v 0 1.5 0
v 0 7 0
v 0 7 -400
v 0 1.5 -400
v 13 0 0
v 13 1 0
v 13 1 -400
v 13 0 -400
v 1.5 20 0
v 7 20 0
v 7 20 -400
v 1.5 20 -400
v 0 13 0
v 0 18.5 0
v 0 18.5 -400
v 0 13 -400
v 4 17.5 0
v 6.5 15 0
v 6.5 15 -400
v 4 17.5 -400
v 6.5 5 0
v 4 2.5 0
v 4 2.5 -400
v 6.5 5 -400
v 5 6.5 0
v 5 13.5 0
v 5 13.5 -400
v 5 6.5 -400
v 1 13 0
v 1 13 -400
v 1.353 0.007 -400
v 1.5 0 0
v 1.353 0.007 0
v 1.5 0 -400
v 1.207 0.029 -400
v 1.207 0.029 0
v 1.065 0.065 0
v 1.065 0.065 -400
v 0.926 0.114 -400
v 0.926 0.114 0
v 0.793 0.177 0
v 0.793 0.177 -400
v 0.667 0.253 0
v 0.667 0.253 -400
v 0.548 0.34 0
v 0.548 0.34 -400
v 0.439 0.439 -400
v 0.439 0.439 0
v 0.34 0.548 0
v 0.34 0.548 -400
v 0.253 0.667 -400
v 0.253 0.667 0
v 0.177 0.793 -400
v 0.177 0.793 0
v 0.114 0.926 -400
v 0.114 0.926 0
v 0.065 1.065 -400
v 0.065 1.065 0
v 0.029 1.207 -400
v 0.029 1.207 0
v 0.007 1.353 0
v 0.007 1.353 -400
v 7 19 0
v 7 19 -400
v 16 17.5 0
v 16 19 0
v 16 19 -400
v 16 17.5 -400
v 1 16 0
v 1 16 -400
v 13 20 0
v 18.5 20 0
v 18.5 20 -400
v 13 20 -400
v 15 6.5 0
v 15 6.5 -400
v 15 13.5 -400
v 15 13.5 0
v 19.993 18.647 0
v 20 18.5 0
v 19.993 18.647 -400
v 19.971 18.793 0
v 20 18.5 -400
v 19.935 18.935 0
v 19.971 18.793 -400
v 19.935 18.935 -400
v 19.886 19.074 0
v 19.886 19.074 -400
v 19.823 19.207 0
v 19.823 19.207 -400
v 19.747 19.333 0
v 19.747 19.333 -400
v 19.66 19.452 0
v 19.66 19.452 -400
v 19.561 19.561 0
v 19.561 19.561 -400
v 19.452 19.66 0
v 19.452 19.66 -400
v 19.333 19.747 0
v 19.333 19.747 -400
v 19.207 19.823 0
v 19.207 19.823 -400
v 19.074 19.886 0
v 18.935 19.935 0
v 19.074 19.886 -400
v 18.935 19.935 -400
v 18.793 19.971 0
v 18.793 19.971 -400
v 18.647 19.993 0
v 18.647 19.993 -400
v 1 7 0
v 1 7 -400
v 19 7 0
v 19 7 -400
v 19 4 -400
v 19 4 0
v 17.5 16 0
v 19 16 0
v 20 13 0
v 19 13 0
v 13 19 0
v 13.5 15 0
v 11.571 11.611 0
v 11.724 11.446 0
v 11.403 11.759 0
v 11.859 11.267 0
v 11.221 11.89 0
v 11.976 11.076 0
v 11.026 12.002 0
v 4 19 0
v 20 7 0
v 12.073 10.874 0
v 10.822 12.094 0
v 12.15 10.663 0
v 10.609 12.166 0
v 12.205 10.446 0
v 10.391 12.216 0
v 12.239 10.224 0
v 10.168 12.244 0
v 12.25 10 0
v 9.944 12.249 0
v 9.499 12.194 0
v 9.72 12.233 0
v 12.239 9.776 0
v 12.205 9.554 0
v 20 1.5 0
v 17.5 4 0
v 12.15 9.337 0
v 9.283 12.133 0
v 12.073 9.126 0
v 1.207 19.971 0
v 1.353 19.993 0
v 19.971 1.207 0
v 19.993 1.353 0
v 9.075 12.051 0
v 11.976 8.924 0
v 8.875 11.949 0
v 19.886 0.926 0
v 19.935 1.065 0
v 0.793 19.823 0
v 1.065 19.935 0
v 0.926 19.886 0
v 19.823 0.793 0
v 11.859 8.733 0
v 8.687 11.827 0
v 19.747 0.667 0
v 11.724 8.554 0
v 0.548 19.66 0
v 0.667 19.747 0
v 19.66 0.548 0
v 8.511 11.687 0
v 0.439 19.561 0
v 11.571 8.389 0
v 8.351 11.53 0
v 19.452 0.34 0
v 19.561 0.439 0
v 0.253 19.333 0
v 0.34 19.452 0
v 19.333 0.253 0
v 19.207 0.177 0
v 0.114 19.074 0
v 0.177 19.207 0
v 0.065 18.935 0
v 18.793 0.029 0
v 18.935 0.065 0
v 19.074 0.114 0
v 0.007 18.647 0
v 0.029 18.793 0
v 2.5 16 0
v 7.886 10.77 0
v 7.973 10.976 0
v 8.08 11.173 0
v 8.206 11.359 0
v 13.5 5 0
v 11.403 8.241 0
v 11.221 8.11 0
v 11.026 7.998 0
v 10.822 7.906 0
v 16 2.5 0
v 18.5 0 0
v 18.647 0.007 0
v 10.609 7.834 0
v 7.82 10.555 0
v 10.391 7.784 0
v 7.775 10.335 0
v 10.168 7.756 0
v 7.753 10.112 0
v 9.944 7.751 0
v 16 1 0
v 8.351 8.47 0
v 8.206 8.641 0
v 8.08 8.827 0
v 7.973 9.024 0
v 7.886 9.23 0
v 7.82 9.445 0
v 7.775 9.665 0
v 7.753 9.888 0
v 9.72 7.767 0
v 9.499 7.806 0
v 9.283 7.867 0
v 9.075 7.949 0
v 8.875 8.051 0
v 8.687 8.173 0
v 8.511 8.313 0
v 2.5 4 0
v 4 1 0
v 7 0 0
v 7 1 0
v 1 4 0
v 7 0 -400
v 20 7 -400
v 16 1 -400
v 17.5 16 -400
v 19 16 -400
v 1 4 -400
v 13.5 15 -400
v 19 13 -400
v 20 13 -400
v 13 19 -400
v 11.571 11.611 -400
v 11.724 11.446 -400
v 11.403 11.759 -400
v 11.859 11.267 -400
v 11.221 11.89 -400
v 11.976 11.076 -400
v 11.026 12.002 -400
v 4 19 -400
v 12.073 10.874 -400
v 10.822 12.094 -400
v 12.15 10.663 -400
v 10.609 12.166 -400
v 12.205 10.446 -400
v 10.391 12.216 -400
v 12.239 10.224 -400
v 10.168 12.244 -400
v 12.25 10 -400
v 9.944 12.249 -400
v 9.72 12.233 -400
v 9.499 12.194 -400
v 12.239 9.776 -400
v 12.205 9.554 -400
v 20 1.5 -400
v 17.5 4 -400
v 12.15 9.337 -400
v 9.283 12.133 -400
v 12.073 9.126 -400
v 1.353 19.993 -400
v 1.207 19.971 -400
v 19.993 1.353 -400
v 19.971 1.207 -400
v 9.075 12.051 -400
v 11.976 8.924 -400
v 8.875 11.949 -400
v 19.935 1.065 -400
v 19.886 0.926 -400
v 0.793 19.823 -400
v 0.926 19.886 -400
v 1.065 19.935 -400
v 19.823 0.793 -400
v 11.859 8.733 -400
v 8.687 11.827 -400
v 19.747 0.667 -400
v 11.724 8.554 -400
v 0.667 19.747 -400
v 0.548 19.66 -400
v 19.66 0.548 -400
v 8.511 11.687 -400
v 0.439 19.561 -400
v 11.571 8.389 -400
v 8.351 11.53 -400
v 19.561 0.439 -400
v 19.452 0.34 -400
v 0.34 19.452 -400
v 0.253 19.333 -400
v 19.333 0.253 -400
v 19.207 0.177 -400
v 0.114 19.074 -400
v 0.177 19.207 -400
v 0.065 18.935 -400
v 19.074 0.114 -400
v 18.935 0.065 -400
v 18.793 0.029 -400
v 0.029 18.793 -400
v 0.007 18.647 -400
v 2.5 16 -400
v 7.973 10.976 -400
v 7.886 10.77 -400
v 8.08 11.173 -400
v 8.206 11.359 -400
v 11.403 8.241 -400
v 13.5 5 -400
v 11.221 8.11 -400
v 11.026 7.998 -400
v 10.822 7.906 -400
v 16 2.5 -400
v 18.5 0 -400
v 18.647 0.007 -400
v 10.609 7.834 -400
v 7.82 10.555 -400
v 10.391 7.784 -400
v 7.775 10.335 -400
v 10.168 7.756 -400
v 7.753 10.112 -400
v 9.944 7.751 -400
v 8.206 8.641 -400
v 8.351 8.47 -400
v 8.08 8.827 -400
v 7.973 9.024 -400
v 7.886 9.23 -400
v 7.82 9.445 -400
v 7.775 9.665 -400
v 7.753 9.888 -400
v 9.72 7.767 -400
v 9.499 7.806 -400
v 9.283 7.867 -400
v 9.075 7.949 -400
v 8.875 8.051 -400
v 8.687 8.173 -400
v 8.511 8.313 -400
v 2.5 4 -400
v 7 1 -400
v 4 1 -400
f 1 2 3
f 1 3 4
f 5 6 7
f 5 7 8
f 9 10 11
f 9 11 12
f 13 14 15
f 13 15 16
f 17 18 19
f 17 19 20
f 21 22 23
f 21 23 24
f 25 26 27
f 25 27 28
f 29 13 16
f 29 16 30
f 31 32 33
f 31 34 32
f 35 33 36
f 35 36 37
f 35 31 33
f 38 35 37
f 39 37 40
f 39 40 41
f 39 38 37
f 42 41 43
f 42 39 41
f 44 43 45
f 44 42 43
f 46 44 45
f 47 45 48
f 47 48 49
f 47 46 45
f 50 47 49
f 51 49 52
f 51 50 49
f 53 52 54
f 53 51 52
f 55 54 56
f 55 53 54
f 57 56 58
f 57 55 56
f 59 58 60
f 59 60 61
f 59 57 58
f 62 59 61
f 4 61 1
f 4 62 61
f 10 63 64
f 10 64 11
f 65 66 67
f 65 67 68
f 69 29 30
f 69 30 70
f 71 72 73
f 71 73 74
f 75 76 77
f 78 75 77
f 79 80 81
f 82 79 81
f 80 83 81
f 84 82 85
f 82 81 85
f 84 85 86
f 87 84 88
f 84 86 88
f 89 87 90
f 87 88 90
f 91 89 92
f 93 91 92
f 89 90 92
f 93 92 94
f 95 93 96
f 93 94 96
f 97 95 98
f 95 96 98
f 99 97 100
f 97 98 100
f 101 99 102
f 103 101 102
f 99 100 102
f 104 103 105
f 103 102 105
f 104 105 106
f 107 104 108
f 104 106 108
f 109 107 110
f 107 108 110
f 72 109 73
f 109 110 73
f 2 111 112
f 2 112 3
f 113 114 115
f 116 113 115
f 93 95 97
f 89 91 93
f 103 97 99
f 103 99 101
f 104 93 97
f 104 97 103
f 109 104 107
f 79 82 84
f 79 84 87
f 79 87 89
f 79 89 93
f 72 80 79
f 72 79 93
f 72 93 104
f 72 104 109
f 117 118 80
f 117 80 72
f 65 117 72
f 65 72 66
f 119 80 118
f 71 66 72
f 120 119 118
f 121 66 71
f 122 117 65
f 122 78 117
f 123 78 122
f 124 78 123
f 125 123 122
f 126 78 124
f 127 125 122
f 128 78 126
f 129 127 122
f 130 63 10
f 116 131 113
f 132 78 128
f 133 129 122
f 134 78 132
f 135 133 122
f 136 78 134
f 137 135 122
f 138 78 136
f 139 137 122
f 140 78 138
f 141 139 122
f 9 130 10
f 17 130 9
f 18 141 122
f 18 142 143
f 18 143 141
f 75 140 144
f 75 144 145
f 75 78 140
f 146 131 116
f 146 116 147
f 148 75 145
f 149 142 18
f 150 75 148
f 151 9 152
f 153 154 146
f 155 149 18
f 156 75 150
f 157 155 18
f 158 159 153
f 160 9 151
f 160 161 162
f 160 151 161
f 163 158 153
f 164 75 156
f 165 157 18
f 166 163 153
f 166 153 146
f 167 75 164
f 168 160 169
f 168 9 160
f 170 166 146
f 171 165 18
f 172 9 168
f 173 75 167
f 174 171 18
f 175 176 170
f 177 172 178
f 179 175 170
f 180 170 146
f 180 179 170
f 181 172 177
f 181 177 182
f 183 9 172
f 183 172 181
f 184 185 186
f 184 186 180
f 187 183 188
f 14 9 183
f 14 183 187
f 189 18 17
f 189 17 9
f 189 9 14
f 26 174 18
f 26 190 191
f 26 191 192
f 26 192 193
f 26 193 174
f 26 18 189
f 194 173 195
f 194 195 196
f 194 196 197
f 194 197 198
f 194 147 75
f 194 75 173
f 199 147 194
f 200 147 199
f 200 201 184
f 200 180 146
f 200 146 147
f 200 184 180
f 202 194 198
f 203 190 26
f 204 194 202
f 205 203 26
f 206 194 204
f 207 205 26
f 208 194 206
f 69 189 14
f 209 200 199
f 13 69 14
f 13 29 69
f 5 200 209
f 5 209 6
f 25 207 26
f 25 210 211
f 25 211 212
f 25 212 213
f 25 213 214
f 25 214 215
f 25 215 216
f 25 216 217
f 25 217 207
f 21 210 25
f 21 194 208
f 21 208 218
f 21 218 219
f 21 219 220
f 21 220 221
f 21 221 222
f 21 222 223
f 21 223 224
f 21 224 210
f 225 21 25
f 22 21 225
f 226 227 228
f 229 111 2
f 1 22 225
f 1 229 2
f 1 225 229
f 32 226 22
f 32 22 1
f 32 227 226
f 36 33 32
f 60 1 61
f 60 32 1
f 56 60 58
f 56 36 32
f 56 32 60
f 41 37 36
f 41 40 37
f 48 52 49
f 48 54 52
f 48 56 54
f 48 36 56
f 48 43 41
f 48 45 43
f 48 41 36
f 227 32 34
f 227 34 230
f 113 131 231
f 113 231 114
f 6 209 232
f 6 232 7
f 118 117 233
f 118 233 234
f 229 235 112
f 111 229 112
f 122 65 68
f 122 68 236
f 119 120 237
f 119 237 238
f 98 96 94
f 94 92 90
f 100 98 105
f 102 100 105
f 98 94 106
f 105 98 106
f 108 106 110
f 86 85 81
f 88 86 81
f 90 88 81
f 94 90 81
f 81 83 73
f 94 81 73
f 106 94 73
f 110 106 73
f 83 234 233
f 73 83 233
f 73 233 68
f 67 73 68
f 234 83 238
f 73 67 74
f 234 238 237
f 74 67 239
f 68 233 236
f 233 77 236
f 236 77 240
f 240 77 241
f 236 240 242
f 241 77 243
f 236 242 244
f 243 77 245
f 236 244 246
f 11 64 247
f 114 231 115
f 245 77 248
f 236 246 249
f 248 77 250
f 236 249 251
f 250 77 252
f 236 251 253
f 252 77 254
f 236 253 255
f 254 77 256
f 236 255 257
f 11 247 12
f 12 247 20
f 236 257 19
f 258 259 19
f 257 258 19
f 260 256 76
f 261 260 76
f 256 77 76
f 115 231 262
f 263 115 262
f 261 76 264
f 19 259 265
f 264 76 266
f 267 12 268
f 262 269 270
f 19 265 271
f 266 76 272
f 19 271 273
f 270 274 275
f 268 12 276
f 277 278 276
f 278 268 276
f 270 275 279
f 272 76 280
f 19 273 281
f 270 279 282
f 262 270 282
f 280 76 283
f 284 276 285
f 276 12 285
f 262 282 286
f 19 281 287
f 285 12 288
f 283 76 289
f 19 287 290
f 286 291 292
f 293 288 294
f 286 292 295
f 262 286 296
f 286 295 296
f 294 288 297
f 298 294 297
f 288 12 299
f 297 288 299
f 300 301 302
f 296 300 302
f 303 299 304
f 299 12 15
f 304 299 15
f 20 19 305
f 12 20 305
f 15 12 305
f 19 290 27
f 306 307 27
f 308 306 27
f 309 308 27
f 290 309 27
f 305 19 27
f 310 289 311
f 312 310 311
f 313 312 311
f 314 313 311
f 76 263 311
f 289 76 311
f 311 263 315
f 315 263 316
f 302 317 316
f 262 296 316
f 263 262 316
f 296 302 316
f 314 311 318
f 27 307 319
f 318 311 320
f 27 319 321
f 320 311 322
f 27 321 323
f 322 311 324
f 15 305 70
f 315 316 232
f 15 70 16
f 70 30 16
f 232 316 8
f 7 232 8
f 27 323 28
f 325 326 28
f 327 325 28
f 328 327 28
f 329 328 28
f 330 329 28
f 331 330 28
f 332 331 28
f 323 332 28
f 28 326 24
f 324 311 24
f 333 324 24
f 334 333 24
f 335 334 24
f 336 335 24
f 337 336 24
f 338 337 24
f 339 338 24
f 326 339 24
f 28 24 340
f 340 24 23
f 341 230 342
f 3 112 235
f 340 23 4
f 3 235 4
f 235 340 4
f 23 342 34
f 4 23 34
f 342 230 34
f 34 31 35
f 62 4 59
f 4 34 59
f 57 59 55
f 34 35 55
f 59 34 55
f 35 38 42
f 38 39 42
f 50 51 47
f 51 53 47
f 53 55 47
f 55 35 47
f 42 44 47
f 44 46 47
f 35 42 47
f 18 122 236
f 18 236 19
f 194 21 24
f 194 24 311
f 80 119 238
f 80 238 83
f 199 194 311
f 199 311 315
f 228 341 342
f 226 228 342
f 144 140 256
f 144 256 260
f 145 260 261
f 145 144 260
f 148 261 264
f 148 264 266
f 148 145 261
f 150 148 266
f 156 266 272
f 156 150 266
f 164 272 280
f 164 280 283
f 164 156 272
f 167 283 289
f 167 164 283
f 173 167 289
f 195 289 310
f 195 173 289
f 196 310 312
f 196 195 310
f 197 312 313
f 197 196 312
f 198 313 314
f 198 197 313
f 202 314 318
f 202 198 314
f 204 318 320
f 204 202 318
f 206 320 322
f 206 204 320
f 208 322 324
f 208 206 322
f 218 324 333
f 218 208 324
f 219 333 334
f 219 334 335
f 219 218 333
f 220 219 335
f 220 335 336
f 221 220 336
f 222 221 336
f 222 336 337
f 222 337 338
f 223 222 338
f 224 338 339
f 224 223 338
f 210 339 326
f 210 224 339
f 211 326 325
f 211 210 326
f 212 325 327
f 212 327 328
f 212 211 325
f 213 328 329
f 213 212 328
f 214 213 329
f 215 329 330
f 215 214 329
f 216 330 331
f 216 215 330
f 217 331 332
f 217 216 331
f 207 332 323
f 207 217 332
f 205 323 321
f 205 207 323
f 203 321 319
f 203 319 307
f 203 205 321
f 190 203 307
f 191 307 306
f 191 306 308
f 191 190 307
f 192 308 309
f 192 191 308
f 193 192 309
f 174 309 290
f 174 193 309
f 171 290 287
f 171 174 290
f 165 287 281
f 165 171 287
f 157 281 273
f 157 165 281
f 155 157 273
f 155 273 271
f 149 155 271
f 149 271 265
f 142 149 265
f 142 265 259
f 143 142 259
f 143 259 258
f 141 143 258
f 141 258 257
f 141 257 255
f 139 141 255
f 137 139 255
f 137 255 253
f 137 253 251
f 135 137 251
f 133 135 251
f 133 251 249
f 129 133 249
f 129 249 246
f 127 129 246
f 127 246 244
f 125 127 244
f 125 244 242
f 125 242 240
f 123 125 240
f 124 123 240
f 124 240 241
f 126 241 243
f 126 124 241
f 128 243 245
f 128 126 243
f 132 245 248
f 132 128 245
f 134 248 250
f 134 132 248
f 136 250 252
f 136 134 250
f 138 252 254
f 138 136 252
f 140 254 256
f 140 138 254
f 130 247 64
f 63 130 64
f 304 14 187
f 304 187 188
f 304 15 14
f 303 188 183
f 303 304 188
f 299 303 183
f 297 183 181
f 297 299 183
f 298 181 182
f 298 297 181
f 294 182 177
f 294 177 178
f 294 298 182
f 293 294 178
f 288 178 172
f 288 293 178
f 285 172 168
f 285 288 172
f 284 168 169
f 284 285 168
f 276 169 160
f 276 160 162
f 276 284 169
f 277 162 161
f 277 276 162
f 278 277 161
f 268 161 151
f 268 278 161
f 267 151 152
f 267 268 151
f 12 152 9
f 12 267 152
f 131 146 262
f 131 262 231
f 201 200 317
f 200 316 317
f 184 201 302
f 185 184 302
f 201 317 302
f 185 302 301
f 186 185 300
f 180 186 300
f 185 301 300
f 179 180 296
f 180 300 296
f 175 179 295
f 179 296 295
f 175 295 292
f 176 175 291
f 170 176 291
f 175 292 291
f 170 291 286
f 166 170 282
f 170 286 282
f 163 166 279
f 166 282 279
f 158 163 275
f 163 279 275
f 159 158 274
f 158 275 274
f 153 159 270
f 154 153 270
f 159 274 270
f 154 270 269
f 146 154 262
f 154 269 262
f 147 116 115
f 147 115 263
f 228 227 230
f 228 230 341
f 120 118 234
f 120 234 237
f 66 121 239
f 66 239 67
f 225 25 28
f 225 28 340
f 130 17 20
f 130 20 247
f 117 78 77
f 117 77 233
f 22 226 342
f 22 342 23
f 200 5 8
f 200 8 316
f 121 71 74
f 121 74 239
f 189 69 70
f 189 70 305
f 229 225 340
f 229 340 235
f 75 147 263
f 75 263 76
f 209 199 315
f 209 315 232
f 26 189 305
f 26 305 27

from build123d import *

# Parameters (mm, degrees)
SKETCH_R  = 2.25
PAD_DEPTH = 400
FILLET_R  = 1.5


with BuildPart() as part:
    # Sketch → Pad (new body)
    with BuildSketch(Plane(origin=(0, 0, 0), x_dir=(1, 0, 0), z_dir=(0, 0, -1))):
        Polygon((7, 0), (7, -1), (4, -1), (4, -2.5), (6.499998, -5), (13.500002, -5), (16, -2.5), (16, -1), (13, -1), (13, 0), (20, 0), (20, -7), (19, -7), (19, -4), (17.5, -4), (15.000002, -6.5), (15.000002, -13.500005), (17.5, -16.000005), (19, -16.000005), (19, -13.000005), (20, -13.000005), (20, -20.000005), (13, -20.000005), (13, -19.000005), (16, -19.000005), (16, -17.500005), (13.500002, -15.000005), (6.499998, -15.000005), (4, -17.500005), (4, -19.000005), (7, -19.000005), (7, -20.000005), (0, -20.000005), (0, -13.000005), (1, -13.000005), (1, -16.000005), (2.5, -16.000005), (4.999998, -13.500005), (4.999998, -6.5), (2.5, -4), (1, -4), (1, -7), (0, -7), (0, 0), align=None)
        with Locations((10, -10.000002)):
            Circle(SKETCH_R, mode=Mode.SUBTRACT)
    extrude(amount=PAD_DEPTH)

    # Fillet
    fillet_edges = [part.edges().sort_by_distance(p)[0] for p in [
        (20, 20.000005, -200),
        (20, 0, -200),
        (0, 20.000005, -200),
        (0, 0, -200),
    ]]
    fillet(fillet_edges, radius=FILLET_R)


solid = part.part
